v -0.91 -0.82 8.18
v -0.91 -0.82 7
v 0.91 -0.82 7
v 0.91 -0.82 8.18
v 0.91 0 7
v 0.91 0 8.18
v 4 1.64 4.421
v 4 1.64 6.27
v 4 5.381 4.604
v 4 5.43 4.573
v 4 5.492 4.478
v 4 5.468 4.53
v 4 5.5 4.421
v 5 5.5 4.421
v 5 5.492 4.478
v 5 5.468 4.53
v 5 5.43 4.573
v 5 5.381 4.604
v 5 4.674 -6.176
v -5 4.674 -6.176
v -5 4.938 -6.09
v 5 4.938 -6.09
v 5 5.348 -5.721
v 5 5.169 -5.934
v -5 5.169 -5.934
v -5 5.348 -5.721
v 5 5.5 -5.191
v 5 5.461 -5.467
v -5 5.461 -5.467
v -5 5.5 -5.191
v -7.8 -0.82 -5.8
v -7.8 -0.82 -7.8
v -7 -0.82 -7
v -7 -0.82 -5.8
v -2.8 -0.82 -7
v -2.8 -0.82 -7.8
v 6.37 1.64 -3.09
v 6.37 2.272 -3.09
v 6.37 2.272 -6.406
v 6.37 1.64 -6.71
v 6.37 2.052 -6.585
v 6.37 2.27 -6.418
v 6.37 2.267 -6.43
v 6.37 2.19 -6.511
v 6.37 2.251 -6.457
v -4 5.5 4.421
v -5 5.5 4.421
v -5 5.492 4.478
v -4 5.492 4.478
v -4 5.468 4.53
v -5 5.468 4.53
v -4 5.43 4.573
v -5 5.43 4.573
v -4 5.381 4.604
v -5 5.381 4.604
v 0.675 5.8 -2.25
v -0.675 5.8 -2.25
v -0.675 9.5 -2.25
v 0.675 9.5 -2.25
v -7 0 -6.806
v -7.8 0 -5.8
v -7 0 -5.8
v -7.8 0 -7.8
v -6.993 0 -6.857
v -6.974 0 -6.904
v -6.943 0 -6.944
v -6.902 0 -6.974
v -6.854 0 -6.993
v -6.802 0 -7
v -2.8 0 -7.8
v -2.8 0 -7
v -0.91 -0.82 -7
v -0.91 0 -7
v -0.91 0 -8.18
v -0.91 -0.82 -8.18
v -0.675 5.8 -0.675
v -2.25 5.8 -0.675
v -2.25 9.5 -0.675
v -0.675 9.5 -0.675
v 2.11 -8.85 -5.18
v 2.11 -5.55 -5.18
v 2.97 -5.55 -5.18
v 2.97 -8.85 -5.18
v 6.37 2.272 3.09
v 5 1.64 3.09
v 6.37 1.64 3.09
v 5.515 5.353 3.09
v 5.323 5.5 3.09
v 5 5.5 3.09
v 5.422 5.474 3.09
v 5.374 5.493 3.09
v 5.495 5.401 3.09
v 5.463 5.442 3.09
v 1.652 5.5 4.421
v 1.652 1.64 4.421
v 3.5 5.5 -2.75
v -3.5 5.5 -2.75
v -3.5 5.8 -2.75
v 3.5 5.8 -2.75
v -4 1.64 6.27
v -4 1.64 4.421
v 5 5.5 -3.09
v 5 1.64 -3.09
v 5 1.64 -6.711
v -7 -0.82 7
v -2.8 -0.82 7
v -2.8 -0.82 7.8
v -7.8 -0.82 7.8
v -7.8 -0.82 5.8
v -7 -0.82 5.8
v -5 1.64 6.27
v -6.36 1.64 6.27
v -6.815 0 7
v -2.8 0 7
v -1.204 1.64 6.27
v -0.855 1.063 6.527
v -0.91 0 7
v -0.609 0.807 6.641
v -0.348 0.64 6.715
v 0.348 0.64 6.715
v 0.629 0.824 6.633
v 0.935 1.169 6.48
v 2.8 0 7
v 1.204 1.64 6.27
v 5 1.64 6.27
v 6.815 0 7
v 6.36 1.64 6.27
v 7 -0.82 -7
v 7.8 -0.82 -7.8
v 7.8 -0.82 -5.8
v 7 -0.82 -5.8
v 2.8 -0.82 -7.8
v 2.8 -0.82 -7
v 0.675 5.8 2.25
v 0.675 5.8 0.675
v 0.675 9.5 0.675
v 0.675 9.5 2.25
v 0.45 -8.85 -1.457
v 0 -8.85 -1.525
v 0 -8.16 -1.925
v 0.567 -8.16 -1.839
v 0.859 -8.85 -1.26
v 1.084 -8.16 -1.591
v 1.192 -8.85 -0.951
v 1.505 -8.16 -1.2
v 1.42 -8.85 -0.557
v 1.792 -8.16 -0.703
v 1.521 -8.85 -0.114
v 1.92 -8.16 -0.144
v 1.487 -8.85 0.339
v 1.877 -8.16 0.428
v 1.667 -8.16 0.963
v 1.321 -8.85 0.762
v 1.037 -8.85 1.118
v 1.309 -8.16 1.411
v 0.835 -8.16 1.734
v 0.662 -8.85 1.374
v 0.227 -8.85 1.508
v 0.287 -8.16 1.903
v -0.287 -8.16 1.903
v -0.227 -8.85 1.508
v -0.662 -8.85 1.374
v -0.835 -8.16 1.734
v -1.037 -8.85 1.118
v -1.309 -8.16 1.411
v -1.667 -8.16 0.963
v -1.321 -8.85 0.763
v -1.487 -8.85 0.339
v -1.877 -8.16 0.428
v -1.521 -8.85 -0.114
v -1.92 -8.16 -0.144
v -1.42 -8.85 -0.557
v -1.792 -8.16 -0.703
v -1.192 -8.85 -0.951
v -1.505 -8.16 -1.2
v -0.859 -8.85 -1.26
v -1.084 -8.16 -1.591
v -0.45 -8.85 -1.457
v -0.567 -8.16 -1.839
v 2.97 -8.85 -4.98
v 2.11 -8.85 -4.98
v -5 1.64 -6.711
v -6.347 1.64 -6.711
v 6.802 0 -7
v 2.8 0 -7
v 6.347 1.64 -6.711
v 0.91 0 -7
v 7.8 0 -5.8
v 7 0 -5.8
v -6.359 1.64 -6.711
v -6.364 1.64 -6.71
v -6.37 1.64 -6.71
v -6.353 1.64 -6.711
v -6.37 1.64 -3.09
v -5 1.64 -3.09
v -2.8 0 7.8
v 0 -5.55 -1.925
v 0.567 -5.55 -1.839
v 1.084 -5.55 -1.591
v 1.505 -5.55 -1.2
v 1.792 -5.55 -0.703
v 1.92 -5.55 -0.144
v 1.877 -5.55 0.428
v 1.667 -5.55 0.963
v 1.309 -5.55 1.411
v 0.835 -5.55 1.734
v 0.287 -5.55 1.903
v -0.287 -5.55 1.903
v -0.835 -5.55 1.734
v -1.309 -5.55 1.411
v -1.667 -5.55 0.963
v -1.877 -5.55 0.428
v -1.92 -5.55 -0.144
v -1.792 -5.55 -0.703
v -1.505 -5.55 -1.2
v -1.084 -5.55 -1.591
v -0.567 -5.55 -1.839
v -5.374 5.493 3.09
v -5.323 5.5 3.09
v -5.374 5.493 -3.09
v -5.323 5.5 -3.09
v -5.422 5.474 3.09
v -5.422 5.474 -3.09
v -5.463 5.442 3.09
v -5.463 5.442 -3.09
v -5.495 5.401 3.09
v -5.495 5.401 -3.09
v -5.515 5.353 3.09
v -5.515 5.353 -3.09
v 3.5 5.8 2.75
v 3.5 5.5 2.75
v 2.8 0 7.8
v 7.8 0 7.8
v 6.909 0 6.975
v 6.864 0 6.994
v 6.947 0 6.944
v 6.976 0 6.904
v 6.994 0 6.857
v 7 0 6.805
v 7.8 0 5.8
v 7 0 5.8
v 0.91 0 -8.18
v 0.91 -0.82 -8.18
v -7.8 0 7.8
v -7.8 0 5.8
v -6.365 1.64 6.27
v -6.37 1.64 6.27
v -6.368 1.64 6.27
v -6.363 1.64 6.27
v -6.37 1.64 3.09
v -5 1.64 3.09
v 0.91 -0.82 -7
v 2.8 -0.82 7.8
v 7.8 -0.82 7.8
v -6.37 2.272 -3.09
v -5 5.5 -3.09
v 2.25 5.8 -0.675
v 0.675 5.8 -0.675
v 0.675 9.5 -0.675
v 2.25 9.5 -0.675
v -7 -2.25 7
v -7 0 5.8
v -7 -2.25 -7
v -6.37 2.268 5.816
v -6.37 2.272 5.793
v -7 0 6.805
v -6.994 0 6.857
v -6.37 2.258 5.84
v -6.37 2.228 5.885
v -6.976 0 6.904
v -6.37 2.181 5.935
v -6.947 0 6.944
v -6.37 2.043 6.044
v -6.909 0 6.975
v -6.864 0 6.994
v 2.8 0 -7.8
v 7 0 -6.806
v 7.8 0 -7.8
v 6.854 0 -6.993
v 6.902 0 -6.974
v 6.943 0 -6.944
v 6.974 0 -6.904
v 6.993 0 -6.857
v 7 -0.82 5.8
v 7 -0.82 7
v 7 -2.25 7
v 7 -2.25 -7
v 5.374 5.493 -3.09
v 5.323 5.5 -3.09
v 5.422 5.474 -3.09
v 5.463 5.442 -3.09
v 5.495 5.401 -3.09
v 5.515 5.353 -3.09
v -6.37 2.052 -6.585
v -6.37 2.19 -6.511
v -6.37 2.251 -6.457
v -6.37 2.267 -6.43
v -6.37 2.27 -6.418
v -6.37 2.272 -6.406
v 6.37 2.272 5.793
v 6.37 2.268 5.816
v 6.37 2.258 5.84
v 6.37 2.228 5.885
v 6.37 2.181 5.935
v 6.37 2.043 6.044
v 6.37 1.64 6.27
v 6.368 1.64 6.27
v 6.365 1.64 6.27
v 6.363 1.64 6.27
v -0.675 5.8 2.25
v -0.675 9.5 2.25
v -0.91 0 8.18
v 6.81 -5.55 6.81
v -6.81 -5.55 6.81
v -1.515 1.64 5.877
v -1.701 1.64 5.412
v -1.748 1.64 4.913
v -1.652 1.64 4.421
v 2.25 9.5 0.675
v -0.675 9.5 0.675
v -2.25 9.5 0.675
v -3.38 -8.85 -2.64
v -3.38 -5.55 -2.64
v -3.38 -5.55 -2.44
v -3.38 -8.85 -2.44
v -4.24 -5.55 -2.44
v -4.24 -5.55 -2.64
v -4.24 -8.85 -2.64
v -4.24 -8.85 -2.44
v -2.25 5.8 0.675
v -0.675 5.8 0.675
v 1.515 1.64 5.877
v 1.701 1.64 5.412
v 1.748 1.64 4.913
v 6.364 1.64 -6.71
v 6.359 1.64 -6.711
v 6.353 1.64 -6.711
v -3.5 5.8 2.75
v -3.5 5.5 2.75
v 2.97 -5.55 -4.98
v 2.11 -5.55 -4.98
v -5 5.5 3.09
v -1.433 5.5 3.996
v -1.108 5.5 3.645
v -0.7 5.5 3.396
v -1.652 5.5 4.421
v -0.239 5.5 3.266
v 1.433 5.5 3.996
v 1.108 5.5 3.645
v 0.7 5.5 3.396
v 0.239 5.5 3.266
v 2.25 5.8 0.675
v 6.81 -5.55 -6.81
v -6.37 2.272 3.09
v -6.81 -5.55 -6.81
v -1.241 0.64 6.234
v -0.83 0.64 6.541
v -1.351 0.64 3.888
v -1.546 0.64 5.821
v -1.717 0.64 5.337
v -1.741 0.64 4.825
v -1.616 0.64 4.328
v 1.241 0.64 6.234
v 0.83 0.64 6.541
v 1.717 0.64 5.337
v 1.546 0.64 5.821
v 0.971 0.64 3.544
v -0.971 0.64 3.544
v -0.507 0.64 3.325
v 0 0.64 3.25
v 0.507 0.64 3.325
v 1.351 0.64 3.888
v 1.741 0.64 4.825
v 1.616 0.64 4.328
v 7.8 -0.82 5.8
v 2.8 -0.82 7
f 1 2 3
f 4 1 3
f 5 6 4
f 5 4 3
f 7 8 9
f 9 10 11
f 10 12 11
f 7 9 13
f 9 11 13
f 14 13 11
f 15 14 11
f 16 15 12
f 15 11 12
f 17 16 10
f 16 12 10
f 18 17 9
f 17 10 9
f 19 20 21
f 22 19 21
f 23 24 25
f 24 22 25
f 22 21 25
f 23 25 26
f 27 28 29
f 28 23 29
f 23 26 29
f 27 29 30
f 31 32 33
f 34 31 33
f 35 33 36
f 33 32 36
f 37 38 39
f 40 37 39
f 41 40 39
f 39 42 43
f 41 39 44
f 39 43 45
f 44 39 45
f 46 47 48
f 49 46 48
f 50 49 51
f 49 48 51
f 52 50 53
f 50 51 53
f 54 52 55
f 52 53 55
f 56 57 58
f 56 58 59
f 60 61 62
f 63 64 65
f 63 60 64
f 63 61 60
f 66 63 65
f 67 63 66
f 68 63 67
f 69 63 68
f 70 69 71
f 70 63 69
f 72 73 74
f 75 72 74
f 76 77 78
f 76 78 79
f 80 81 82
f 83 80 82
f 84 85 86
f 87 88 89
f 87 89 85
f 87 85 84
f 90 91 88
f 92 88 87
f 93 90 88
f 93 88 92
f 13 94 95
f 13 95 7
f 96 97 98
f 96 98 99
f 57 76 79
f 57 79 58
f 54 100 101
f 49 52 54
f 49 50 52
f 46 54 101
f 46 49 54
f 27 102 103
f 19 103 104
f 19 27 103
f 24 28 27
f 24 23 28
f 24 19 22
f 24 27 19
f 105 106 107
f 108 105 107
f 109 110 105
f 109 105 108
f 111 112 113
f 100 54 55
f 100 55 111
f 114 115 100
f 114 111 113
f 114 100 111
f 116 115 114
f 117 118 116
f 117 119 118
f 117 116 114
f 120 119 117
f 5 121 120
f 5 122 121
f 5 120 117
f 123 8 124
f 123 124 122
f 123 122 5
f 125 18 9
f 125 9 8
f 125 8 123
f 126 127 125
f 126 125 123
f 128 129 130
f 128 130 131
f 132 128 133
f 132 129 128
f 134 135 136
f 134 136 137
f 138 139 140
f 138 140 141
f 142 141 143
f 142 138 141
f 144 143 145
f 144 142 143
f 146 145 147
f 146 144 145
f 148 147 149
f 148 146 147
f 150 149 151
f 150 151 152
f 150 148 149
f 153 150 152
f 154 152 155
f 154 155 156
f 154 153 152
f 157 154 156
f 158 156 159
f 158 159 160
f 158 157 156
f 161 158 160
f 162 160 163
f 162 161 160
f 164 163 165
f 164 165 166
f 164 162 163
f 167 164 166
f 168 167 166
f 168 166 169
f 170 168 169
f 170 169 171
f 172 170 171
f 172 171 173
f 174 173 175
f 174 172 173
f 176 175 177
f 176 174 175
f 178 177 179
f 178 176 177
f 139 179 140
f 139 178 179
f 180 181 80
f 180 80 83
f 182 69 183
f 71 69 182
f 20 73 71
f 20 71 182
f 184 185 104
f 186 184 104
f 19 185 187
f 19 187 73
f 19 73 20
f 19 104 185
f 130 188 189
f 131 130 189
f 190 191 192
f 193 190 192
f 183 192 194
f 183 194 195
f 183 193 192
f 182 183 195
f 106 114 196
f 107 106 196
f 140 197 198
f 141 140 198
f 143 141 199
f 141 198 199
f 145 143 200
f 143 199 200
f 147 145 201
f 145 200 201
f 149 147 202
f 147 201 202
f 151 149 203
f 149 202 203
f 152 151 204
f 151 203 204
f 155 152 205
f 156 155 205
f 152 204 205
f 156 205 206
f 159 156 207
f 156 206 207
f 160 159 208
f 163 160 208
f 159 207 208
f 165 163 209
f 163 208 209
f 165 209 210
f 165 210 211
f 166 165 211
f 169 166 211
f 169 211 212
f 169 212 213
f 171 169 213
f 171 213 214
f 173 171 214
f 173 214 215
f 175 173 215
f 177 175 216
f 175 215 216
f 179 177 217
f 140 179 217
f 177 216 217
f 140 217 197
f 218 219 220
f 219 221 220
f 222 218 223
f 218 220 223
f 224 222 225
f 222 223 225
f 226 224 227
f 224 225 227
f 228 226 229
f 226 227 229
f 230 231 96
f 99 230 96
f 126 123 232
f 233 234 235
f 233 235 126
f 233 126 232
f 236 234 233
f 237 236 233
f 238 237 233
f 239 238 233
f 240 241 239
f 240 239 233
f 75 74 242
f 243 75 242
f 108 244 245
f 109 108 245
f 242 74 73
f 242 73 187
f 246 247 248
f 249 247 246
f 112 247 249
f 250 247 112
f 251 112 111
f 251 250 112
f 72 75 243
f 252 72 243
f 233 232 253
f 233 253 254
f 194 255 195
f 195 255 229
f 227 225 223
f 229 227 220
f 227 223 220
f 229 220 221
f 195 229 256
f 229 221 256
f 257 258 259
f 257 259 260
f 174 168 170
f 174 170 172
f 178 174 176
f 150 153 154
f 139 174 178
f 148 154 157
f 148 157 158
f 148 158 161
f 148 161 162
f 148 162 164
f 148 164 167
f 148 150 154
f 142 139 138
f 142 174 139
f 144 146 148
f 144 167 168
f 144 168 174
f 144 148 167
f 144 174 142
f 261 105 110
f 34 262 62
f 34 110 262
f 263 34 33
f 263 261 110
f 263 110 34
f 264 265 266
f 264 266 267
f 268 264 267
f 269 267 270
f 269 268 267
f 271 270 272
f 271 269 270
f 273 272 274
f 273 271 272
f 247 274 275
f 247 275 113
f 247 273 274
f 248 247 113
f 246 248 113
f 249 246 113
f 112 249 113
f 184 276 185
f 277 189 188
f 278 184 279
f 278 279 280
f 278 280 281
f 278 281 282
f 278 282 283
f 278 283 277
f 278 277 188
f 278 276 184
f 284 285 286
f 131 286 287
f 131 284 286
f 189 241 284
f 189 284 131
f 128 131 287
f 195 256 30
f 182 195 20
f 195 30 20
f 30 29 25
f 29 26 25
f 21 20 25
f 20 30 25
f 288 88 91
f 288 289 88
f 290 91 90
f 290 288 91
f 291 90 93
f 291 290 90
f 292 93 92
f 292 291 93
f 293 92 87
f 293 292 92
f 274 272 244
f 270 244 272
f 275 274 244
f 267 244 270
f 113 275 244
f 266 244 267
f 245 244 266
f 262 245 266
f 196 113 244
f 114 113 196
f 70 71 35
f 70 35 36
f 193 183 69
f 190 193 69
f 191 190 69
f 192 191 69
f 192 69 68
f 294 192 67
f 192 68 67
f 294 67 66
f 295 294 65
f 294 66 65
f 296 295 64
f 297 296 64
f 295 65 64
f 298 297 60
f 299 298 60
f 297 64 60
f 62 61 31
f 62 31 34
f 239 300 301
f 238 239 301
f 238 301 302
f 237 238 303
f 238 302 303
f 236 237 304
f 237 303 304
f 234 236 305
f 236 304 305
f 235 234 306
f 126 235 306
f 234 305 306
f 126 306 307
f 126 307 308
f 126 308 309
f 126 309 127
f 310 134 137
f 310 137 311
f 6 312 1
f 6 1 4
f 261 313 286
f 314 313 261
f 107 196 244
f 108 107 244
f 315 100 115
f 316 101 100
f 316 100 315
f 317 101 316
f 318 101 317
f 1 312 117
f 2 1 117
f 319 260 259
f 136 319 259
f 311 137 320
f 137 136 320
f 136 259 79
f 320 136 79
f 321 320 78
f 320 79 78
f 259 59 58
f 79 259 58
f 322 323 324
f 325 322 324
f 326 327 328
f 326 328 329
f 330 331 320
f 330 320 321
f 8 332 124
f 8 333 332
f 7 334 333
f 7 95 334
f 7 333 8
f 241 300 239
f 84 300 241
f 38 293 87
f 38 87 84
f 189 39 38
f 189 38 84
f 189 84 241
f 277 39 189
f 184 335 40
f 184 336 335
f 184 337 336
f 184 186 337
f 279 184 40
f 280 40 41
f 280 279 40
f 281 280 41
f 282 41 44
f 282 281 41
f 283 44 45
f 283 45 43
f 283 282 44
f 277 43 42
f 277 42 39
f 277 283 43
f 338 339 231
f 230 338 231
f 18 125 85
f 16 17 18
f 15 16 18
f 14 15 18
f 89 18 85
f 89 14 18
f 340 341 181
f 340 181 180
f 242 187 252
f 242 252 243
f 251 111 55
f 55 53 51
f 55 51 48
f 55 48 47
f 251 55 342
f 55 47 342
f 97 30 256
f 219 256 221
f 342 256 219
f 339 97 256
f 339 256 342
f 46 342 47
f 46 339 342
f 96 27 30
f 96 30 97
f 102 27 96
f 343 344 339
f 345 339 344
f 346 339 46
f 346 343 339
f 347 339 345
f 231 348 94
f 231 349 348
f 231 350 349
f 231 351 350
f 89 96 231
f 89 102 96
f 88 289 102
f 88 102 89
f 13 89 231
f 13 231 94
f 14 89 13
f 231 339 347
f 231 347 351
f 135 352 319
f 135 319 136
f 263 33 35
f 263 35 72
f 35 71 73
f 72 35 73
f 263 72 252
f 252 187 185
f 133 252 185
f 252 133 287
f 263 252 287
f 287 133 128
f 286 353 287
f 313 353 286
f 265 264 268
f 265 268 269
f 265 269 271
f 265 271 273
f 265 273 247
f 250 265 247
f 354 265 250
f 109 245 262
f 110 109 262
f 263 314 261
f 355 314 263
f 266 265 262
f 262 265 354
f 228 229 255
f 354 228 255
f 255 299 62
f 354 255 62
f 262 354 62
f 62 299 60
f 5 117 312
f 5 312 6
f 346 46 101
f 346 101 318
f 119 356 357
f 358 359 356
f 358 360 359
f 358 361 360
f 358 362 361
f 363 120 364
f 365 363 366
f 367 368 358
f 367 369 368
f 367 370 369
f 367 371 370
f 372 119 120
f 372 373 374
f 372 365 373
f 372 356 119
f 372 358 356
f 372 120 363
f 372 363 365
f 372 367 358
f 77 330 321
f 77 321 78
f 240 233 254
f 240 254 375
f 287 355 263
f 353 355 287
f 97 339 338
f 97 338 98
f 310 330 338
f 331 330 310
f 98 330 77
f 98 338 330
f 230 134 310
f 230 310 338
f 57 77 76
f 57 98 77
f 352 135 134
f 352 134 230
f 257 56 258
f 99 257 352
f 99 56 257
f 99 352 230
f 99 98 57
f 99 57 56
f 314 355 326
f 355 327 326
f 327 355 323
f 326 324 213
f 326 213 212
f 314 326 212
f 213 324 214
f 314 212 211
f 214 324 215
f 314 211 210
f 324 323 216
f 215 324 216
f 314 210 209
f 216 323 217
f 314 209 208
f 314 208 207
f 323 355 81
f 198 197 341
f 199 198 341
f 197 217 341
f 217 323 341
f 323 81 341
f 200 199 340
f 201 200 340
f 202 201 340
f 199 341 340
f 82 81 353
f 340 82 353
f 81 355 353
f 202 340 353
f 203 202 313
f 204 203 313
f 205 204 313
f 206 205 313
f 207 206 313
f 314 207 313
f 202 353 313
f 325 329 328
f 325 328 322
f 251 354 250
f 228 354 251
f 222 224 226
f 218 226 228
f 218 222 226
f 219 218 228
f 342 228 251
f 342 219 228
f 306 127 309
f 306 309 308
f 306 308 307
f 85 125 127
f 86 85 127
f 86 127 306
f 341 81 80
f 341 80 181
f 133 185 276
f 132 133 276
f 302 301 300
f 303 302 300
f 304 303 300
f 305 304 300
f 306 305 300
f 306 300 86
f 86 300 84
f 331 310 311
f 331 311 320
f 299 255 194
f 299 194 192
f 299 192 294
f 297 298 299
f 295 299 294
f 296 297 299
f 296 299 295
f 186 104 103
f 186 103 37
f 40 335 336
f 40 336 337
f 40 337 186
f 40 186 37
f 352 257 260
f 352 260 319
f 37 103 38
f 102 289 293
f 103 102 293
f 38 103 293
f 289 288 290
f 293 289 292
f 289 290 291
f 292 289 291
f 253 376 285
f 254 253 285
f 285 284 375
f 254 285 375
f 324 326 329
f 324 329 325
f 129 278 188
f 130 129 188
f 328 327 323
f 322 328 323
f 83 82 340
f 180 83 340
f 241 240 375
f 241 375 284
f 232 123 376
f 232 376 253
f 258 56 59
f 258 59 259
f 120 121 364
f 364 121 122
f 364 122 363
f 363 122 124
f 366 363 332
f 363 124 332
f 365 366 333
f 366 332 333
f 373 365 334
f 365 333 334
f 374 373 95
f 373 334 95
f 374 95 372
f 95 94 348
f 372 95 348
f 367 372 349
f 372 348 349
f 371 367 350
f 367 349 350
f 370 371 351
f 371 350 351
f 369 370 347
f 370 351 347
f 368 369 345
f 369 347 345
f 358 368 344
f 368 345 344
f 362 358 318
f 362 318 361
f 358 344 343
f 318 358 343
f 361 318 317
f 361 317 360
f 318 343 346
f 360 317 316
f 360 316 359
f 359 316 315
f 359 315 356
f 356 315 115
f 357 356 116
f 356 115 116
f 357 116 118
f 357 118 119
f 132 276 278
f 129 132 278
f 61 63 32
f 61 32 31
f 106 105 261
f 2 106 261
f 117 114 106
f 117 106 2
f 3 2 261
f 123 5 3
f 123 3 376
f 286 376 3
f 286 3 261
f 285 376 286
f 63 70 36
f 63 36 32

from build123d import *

# Parameters (mm, degrees)
SKETCH1_W           = 14
SKETCH1_H           = 14
BOSS_EXTRUDE1_DEPTH = 2.25
SKETCH2_W           = 14
SKETCH2_H           = 14
BOSS_EXTRUDE2_DEPTH = 3.3
BOSS_EXTRUDE2_TAPER = 3.3
SKETCH3_R           = 1.925
BOSS_EXTRUDE3_DEPTH = 3.3
CHAMFER1_SIZE       = 0.69
CHAMFER1_SIZE2      = 0.4
SKETCH4_W           = 0.86
SKETCH4_H           = 0.2
BOSS_EXTRUDE4_DEPTH = 3.3
SKETCH5_W           = 1.82
SKETCH5_H           = 1.18
BOSS_EXTRUDE5_DEPTH = 0.82
BOSS_EXTRUDE6_REACH = 21.086
CUT_EXTRUDE2_START  = -14
CUT_EXTRUDE2_DEPTH  = 14
FILLET1_R           = 1
FILLET2_R           = 0.2
SKETCH9_W           = 1.37
SKETCH9_H           = 3.91
SKETCH9_W_2         = 8
SKETCH9_H_2         = 2.578639288
CUT_EXTRUDE3_DEPTH  = 3.86
SKETCH10_R          = 1.75
CUT_EXTRUDE4_DEPTH  = 4.86
BOSS_EXTRUDE7_DEPTH = 4
SKETCH12_W          = 7
SKETCH12_H          = 5.5
BOSS_EXTRUDE8_DEPTH = 0.3


with BuildPart() as part:
    # Sketch1 → Boss-Extrude1 (new body)
    with BuildSketch(Plane(origin=(0, 0, 0), x_dir=(1, 0, 0), z_dir=(0, 1, 0))):
        Rectangle(SKETCH1_W, SKETCH1_H)
    extrude(amount=-BOSS_EXTRUDE1_DEPTH)

    # Sketch2 → Boss-Extrude2 (add)
    with BuildSketch(Plane.XZ.offset(2.25)):
        Rectangle(SKETCH2_W, SKETCH2_H)
    extrude(amount=BOSS_EXTRUDE2_DEPTH, taper=BOSS_EXTRUDE2_TAPER)

    # Sketch3 → Boss-Extrude3 (add)
    with BuildSketch(Plane.XZ.offset(5.55)):
        with Locations(Location((0, 0, 0), (0, 0, 270))):
            Circle(SKETCH3_R)
    extrude(amount=BOSS_EXTRUDE3_DEPTH)

    # Chamfer1
    chamfer1_edges = [part.edges().sort_by_distance(p)[0] for p in [
        (0, -8.85, 1.925),
    ]]
    chamfer1_side = [part.faces().sort_by_distance(p)[0] for p in [
        (0, -7.2, 1.925),
    ]]
    chamfer(chamfer1_edges, length=CHAMFER1_SIZE, length2=CHAMFER1_SIZE2, reference=chamfer1_side[0])

    # Sketch4 → Boss-Extrude4 (add)
    with BuildSketch(Plane.XZ.offset(5.55)):
        with Locations((-3.81, -2.54)):
            Rectangle(SKETCH4_W, SKETCH4_H)
        with Locations((2.54, -5.08)):
            Rectangle(SKETCH4_W, SKETCH4_H)
    extrude(amount=BOSS_EXTRUDE4_DEPTH)

    # Sketch5 → Boss-Extrude5 (add)
    with BuildSketch(Plane(origin=(0, 0, 0), x_dir=(1, 0, 0), z_dir=(0, 1, 0))):
        with Locations((0, 7.59)):
            Rectangle(SKETCH5_W, SKETCH5_H)
        Polygon((-2.8, 7), (-2.8, 7.8), (-7.8, 7.8), (-7.8, 5.8), (-7, 5.8), (-7, 7), align=None)
        Polygon((7, 7), (2.8, 7), (2.8, 7.8), (7.8, 7.8), (7.8, 5.8), (7, 5.8), align=None)
        with Locations((0, -7.59)):
            Rectangle(SKETCH5_W, SKETCH5_H)
        Polygon((2.8, -7), (2.8, -7.8), (7.8, -7.8), (7.8, -5.8), (7, -5.8), (7, -7), align=None)
        Polygon((-7, -7), (-2.8, -7), (-2.8, -7.8), (-7.8, -7.8), (-7.8, -5.8), (-7, -5.8), align=None)
    extrude(amount=-BOSS_EXTRUDE5_DEPTH)

    # Boss-Extrude6: up to this face of the body (flat: up to its plane)
    boss_extrude6_end = Plane(part.part.faces().sort_by_distance((-7, -1.172647298, 0))[0])
    # Sketch6 → Boss-Extrude6 (add, up to the picked face)
    with BuildSketch(Plane(origin=(7, 0, 0), x_dir=(0, 0, -1), z_dir=(1, 0, 0)), mode=Mode.PRIVATE) as boss_extrude6_sk1:
        Polygon((7, 0), (6.030201606, 5.5), (-4.551242231, 5.5), (-7, 0), align=None)
    boss_extrude6_tool1 = split(extrude(boss_extrude6_sk1.sketch, amount=-BOSS_EXTRUDE6_REACH, mode=Mode.PRIVATE), bisect_by=boss_extrude6_end, keep=Keep.BOTH, mode=Mode.PRIVATE)
    add(boss_extrude6_tool1.solids().sort_by(Axis((7, 2.622519, -0.3526), (-1, 0, 0)))[0])

    # Sketch8 → Cut-Extrude2 (cut)
    with BuildSketch(Plane.XY.offset(7).offset(CUT_EXTRUDE2_START)):
        Polygon((-5.474715008, 5.5), (-7, 0), (-7, 5.5), align=None)
        Polygon((7, 5.5), (5.474715008, 5.5), (7, 0), align=None)
    extrude(amount=CUT_EXTRUDE2_DEPTH, mode=Mode.SUBTRACT)

    # Fillet1
    fillet1_edges = [part.edges().sort_by_distance(p)[0] for p in [
        (0, 5.5, -6.030201606),
    ]]
    fillet(fillet1_edges, radius=FILLET1_R)

    # Fillet2
    fillet2_edges = [part.edges().sort_by_distance(p)[0] for p in [
        (0, 5.5, 4.551242231),
        (6.237357504, 2.75, 5.775621115),
        (-6.237357504, 2.75, 5.775621115),
        (6.351941325, 2.336824089, -6.587954864),
        (-6.351941325, 2.336824089, -6.587954864),
        (5.474715008, 5.5, -0.319929872),
        (5.540952526, 5.261155225, -5.839671727),
        (-5.474715008, 5.5, -0.319929872),
        (-5.540952526, 5.261155225, -5.839671727),
    ]]
    fillet(fillet2_edges, radius=FILLET2_R)

    # Sketch9 → Cut-Extrude3 (cut)
    with BuildSketch(Plane(origin=(0, 5.5, 0), x_dir=(1, 0, 0), z_dir=(0, 1, 0))):
        with Locations((-5.685, 5.045)):
            Rectangle(SKETCH9_W, SKETCH9_H)
        with Locations((5.685, 5.045)):
            Rectangle(SKETCH9_W, SKETCH9_H)
        with Locations((5.685, -5.045)):
            Rectangle(SKETCH9_W, SKETCH9_H)
        with Locations((-5.685, -5.045)):
            Rectangle(SKETCH9_W, SKETCH9_H)
        with Locations((0, -5.710680356)):
            Rectangle(SKETCH9_W_2, SKETCH9_H_2)
    extrude(amount=-CUT_EXTRUDE3_DEPTH, mode=Mode.SUBTRACT)

    # Sketch10 → Cut-Extrude4 (cut)
    with BuildSketch(Plane(origin=(0, 5.5, 0), x_dir=(1, 0, 0), z_dir=(0, 1, 0))):
        with Locations((0, -5)):
            Circle(SKETCH10_R)
    extrude(amount=-CUT_EXTRUDE4_DEPTH, mode=Mode.SUBTRACT)

    # Sketch11 → Boss-Extrude7 (add)
    with BuildSketch(Plane(origin=(0, 5.5, 0), x_dir=(1, 0, 0), z_dir=(0, 1, 0))):
        Polygon((0.675, -2.25), (-0.675, -2.25), (-0.675, -0.675), (-2.25, -0.675), (-2.25, 0.675), (-0.675, 0.675), (-0.675, 2.25), (0.675, 2.25), (0.675, 0.675), (2.25, 0.675), (2.25, -0.675), (0.675, -0.675), align=None)
    extrude(amount=BOSS_EXTRUDE7_DEPTH)

    # Sketch12 → Boss-Extrude8 (add)
    with BuildSketch(Plane(origin=(0, 5.5, 0), x_dir=(1, 0, 0), z_dir=(0, 1, 0))):
        Rectangle(SKETCH12_W, SKETCH12_H)
    extrude(amount=BOSS_EXTRUDE8_DEPTH)


solid = part.part
